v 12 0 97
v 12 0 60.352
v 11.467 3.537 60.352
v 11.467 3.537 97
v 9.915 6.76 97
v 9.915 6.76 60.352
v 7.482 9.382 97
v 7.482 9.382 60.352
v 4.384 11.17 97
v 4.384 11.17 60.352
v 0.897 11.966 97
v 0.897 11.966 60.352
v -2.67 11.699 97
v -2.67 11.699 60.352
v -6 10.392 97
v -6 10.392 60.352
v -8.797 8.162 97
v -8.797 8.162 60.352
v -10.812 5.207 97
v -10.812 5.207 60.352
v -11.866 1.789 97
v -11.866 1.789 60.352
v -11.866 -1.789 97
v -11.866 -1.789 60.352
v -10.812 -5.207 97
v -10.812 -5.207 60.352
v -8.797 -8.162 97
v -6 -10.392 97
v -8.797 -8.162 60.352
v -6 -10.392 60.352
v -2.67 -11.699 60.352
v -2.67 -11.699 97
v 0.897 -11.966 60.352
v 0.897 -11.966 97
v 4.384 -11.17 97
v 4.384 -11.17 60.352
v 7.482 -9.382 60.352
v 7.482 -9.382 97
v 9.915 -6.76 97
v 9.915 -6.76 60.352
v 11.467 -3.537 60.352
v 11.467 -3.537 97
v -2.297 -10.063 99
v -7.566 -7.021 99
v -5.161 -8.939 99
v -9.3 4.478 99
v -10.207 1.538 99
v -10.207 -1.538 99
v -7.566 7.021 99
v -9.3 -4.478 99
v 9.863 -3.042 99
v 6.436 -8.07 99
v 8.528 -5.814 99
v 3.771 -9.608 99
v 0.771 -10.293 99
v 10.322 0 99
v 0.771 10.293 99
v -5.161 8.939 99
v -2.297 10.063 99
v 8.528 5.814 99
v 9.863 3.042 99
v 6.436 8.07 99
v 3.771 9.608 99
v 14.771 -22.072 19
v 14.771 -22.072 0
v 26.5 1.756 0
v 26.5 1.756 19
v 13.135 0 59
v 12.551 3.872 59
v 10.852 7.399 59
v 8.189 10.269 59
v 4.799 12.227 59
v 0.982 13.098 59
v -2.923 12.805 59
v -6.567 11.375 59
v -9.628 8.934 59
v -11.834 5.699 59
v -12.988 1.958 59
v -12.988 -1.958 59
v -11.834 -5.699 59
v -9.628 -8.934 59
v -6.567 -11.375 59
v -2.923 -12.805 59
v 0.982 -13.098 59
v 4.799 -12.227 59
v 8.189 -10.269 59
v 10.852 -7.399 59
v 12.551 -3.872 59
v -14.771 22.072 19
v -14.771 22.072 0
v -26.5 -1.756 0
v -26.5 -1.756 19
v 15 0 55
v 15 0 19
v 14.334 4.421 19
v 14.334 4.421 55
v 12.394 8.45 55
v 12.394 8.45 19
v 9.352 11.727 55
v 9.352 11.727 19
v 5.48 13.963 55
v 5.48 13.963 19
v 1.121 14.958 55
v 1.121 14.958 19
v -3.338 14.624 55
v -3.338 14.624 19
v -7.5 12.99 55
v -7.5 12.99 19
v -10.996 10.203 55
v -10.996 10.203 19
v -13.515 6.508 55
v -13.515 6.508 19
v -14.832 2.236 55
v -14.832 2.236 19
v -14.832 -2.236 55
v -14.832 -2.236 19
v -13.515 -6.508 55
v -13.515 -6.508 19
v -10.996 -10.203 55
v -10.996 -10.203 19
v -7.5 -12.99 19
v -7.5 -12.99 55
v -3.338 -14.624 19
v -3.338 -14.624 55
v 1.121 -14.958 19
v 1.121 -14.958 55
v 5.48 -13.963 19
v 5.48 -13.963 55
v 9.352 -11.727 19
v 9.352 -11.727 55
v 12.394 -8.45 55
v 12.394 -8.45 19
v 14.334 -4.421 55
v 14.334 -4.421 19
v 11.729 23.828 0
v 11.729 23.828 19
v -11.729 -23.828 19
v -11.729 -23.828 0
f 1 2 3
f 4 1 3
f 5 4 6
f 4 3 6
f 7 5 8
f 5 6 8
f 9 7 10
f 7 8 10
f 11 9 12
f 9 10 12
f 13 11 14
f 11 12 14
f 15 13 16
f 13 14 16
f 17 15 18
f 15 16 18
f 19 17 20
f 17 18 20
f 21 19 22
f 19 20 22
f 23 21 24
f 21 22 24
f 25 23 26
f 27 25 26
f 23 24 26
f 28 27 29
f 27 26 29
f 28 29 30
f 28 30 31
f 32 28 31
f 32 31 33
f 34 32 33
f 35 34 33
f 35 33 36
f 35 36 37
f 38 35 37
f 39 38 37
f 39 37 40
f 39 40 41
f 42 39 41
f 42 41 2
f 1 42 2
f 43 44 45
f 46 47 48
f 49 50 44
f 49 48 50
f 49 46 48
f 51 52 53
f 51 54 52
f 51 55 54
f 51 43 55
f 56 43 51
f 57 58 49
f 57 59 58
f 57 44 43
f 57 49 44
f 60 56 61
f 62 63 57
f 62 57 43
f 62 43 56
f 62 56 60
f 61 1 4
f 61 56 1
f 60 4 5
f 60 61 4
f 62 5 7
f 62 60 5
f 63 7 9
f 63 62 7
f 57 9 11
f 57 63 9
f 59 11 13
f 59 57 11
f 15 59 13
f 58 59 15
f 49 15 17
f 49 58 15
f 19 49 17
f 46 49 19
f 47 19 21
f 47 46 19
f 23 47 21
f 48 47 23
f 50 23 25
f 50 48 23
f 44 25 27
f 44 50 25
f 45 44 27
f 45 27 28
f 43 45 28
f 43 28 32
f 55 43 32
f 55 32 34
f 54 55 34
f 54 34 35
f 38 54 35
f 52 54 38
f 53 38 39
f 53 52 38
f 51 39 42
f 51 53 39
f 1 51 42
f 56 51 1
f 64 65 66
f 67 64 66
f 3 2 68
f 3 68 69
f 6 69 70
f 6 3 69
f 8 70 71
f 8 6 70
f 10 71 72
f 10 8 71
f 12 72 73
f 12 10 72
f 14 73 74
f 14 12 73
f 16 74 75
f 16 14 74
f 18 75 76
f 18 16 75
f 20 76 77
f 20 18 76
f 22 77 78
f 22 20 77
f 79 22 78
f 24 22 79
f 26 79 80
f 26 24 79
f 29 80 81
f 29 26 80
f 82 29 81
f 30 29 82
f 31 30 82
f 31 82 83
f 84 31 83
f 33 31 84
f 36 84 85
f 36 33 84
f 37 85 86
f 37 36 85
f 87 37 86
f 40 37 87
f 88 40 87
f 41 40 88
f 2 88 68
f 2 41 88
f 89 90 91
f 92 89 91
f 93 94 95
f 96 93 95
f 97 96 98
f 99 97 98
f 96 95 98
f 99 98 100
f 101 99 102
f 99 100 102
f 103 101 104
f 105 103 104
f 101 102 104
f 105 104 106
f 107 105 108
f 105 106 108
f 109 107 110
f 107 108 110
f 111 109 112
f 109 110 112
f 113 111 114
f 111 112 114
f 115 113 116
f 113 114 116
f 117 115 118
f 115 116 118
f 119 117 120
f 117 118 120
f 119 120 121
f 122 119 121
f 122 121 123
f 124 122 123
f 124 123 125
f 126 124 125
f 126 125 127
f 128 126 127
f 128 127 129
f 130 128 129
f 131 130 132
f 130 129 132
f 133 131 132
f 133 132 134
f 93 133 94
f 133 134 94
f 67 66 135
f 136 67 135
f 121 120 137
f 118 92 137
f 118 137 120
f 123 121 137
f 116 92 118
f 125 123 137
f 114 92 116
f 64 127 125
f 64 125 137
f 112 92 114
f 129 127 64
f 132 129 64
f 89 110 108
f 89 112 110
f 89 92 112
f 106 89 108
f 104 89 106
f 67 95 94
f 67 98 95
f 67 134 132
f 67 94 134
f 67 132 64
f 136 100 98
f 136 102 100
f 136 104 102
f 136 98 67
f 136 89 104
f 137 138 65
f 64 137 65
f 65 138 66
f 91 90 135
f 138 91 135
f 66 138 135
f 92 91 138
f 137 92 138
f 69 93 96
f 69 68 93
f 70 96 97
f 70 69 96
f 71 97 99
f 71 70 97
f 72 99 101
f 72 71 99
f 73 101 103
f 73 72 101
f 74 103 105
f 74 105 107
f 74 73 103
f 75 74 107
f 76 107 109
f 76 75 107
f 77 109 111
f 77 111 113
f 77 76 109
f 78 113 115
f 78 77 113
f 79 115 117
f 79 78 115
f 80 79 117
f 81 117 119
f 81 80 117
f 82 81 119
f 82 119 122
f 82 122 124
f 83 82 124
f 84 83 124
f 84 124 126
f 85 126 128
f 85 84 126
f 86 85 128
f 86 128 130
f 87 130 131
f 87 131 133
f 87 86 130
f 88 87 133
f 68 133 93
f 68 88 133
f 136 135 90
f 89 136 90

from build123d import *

# Parameters (mm, degrees)
SKETCH_1_R      = 15
EXTRUDE_1_DEPTH = 1
EXTRUDE_2_DEPTH = 19
SKETCH_9_R      = 15
EXTRUDE_3_DEPTH = 36
SKETCH_11_R     = 15
EXTRUDE_6_DEPTH = 4
EXTRUDE_6_TAPER = 25
SKETCH_12_R     = 12
EXTRUDE_7_DEPTH = 38
SKETCH_13_R     = 13.134769367
EXTRUDE_8_DEPTH = 2
EXTRUDE_8_TAPER = 40
SKETCH_15_R     = 12
EXTRUDE_9_DEPTH = 2
EXTRUDE_9_TAPER = 40


with BuildPart() as part:
    # 草图1 → 拉伸1 (new body)
    with BuildSketch(Plane.XY):
        Circle(SKETCH_1_R)
    extrude(amount=EXTRUDE_1_DEPTH)

    # 草图2 → 拉伸2 (add)
    with BuildSketch(Plane.XY):
        Polygon((14.770690633, -22.071702054), (26.5, 1.755942292), (11.729309367, 23.827644346), (-14.770690633, 22.071702054), (-26.5, -1.755942292), (-11.729309367, -23.827644346), align=None)
    extrude(amount=EXTRUDE_2_DEPTH)

    # 草图9 → 拉伸3 (add)
    with BuildSketch(Plane.XY.offset(19)):
        Circle(SKETCH_9_R)
    extrude(amount=EXTRUDE_3_DEPTH)

    # 草图11 → 拉伸6 (add)
    with BuildSketch(Plane.XY.offset(55)):
        Circle(SKETCH_11_R)
    extrude(amount=EXTRUDE_6_DEPTH, taper=EXTRUDE_6_TAPER)

    # 草图12 → 拉伸7 (add)
    with BuildSketch(Plane.XY.offset(59)):
        Circle(SKETCH_12_R)
    extrude(amount=EXTRUDE_7_DEPTH)

    # 草图13 → 拉伸8 (add)
    with BuildSketch(Plane.XY.offset(59)):
        Circle(SKETCH_13_R)
    extrude(amount=EXTRUDE_8_DEPTH, taper=EXTRUDE_8_TAPER)

    # 草图15 → 拉伸9 (add)
    with BuildSketch(Plane.XY.offset(97)):
        Circle(SKETCH_15_R)
    extrude(amount=EXTRUDE_9_DEPTH, taper=EXTRUDE_9_TAPER)


solid = part.part
